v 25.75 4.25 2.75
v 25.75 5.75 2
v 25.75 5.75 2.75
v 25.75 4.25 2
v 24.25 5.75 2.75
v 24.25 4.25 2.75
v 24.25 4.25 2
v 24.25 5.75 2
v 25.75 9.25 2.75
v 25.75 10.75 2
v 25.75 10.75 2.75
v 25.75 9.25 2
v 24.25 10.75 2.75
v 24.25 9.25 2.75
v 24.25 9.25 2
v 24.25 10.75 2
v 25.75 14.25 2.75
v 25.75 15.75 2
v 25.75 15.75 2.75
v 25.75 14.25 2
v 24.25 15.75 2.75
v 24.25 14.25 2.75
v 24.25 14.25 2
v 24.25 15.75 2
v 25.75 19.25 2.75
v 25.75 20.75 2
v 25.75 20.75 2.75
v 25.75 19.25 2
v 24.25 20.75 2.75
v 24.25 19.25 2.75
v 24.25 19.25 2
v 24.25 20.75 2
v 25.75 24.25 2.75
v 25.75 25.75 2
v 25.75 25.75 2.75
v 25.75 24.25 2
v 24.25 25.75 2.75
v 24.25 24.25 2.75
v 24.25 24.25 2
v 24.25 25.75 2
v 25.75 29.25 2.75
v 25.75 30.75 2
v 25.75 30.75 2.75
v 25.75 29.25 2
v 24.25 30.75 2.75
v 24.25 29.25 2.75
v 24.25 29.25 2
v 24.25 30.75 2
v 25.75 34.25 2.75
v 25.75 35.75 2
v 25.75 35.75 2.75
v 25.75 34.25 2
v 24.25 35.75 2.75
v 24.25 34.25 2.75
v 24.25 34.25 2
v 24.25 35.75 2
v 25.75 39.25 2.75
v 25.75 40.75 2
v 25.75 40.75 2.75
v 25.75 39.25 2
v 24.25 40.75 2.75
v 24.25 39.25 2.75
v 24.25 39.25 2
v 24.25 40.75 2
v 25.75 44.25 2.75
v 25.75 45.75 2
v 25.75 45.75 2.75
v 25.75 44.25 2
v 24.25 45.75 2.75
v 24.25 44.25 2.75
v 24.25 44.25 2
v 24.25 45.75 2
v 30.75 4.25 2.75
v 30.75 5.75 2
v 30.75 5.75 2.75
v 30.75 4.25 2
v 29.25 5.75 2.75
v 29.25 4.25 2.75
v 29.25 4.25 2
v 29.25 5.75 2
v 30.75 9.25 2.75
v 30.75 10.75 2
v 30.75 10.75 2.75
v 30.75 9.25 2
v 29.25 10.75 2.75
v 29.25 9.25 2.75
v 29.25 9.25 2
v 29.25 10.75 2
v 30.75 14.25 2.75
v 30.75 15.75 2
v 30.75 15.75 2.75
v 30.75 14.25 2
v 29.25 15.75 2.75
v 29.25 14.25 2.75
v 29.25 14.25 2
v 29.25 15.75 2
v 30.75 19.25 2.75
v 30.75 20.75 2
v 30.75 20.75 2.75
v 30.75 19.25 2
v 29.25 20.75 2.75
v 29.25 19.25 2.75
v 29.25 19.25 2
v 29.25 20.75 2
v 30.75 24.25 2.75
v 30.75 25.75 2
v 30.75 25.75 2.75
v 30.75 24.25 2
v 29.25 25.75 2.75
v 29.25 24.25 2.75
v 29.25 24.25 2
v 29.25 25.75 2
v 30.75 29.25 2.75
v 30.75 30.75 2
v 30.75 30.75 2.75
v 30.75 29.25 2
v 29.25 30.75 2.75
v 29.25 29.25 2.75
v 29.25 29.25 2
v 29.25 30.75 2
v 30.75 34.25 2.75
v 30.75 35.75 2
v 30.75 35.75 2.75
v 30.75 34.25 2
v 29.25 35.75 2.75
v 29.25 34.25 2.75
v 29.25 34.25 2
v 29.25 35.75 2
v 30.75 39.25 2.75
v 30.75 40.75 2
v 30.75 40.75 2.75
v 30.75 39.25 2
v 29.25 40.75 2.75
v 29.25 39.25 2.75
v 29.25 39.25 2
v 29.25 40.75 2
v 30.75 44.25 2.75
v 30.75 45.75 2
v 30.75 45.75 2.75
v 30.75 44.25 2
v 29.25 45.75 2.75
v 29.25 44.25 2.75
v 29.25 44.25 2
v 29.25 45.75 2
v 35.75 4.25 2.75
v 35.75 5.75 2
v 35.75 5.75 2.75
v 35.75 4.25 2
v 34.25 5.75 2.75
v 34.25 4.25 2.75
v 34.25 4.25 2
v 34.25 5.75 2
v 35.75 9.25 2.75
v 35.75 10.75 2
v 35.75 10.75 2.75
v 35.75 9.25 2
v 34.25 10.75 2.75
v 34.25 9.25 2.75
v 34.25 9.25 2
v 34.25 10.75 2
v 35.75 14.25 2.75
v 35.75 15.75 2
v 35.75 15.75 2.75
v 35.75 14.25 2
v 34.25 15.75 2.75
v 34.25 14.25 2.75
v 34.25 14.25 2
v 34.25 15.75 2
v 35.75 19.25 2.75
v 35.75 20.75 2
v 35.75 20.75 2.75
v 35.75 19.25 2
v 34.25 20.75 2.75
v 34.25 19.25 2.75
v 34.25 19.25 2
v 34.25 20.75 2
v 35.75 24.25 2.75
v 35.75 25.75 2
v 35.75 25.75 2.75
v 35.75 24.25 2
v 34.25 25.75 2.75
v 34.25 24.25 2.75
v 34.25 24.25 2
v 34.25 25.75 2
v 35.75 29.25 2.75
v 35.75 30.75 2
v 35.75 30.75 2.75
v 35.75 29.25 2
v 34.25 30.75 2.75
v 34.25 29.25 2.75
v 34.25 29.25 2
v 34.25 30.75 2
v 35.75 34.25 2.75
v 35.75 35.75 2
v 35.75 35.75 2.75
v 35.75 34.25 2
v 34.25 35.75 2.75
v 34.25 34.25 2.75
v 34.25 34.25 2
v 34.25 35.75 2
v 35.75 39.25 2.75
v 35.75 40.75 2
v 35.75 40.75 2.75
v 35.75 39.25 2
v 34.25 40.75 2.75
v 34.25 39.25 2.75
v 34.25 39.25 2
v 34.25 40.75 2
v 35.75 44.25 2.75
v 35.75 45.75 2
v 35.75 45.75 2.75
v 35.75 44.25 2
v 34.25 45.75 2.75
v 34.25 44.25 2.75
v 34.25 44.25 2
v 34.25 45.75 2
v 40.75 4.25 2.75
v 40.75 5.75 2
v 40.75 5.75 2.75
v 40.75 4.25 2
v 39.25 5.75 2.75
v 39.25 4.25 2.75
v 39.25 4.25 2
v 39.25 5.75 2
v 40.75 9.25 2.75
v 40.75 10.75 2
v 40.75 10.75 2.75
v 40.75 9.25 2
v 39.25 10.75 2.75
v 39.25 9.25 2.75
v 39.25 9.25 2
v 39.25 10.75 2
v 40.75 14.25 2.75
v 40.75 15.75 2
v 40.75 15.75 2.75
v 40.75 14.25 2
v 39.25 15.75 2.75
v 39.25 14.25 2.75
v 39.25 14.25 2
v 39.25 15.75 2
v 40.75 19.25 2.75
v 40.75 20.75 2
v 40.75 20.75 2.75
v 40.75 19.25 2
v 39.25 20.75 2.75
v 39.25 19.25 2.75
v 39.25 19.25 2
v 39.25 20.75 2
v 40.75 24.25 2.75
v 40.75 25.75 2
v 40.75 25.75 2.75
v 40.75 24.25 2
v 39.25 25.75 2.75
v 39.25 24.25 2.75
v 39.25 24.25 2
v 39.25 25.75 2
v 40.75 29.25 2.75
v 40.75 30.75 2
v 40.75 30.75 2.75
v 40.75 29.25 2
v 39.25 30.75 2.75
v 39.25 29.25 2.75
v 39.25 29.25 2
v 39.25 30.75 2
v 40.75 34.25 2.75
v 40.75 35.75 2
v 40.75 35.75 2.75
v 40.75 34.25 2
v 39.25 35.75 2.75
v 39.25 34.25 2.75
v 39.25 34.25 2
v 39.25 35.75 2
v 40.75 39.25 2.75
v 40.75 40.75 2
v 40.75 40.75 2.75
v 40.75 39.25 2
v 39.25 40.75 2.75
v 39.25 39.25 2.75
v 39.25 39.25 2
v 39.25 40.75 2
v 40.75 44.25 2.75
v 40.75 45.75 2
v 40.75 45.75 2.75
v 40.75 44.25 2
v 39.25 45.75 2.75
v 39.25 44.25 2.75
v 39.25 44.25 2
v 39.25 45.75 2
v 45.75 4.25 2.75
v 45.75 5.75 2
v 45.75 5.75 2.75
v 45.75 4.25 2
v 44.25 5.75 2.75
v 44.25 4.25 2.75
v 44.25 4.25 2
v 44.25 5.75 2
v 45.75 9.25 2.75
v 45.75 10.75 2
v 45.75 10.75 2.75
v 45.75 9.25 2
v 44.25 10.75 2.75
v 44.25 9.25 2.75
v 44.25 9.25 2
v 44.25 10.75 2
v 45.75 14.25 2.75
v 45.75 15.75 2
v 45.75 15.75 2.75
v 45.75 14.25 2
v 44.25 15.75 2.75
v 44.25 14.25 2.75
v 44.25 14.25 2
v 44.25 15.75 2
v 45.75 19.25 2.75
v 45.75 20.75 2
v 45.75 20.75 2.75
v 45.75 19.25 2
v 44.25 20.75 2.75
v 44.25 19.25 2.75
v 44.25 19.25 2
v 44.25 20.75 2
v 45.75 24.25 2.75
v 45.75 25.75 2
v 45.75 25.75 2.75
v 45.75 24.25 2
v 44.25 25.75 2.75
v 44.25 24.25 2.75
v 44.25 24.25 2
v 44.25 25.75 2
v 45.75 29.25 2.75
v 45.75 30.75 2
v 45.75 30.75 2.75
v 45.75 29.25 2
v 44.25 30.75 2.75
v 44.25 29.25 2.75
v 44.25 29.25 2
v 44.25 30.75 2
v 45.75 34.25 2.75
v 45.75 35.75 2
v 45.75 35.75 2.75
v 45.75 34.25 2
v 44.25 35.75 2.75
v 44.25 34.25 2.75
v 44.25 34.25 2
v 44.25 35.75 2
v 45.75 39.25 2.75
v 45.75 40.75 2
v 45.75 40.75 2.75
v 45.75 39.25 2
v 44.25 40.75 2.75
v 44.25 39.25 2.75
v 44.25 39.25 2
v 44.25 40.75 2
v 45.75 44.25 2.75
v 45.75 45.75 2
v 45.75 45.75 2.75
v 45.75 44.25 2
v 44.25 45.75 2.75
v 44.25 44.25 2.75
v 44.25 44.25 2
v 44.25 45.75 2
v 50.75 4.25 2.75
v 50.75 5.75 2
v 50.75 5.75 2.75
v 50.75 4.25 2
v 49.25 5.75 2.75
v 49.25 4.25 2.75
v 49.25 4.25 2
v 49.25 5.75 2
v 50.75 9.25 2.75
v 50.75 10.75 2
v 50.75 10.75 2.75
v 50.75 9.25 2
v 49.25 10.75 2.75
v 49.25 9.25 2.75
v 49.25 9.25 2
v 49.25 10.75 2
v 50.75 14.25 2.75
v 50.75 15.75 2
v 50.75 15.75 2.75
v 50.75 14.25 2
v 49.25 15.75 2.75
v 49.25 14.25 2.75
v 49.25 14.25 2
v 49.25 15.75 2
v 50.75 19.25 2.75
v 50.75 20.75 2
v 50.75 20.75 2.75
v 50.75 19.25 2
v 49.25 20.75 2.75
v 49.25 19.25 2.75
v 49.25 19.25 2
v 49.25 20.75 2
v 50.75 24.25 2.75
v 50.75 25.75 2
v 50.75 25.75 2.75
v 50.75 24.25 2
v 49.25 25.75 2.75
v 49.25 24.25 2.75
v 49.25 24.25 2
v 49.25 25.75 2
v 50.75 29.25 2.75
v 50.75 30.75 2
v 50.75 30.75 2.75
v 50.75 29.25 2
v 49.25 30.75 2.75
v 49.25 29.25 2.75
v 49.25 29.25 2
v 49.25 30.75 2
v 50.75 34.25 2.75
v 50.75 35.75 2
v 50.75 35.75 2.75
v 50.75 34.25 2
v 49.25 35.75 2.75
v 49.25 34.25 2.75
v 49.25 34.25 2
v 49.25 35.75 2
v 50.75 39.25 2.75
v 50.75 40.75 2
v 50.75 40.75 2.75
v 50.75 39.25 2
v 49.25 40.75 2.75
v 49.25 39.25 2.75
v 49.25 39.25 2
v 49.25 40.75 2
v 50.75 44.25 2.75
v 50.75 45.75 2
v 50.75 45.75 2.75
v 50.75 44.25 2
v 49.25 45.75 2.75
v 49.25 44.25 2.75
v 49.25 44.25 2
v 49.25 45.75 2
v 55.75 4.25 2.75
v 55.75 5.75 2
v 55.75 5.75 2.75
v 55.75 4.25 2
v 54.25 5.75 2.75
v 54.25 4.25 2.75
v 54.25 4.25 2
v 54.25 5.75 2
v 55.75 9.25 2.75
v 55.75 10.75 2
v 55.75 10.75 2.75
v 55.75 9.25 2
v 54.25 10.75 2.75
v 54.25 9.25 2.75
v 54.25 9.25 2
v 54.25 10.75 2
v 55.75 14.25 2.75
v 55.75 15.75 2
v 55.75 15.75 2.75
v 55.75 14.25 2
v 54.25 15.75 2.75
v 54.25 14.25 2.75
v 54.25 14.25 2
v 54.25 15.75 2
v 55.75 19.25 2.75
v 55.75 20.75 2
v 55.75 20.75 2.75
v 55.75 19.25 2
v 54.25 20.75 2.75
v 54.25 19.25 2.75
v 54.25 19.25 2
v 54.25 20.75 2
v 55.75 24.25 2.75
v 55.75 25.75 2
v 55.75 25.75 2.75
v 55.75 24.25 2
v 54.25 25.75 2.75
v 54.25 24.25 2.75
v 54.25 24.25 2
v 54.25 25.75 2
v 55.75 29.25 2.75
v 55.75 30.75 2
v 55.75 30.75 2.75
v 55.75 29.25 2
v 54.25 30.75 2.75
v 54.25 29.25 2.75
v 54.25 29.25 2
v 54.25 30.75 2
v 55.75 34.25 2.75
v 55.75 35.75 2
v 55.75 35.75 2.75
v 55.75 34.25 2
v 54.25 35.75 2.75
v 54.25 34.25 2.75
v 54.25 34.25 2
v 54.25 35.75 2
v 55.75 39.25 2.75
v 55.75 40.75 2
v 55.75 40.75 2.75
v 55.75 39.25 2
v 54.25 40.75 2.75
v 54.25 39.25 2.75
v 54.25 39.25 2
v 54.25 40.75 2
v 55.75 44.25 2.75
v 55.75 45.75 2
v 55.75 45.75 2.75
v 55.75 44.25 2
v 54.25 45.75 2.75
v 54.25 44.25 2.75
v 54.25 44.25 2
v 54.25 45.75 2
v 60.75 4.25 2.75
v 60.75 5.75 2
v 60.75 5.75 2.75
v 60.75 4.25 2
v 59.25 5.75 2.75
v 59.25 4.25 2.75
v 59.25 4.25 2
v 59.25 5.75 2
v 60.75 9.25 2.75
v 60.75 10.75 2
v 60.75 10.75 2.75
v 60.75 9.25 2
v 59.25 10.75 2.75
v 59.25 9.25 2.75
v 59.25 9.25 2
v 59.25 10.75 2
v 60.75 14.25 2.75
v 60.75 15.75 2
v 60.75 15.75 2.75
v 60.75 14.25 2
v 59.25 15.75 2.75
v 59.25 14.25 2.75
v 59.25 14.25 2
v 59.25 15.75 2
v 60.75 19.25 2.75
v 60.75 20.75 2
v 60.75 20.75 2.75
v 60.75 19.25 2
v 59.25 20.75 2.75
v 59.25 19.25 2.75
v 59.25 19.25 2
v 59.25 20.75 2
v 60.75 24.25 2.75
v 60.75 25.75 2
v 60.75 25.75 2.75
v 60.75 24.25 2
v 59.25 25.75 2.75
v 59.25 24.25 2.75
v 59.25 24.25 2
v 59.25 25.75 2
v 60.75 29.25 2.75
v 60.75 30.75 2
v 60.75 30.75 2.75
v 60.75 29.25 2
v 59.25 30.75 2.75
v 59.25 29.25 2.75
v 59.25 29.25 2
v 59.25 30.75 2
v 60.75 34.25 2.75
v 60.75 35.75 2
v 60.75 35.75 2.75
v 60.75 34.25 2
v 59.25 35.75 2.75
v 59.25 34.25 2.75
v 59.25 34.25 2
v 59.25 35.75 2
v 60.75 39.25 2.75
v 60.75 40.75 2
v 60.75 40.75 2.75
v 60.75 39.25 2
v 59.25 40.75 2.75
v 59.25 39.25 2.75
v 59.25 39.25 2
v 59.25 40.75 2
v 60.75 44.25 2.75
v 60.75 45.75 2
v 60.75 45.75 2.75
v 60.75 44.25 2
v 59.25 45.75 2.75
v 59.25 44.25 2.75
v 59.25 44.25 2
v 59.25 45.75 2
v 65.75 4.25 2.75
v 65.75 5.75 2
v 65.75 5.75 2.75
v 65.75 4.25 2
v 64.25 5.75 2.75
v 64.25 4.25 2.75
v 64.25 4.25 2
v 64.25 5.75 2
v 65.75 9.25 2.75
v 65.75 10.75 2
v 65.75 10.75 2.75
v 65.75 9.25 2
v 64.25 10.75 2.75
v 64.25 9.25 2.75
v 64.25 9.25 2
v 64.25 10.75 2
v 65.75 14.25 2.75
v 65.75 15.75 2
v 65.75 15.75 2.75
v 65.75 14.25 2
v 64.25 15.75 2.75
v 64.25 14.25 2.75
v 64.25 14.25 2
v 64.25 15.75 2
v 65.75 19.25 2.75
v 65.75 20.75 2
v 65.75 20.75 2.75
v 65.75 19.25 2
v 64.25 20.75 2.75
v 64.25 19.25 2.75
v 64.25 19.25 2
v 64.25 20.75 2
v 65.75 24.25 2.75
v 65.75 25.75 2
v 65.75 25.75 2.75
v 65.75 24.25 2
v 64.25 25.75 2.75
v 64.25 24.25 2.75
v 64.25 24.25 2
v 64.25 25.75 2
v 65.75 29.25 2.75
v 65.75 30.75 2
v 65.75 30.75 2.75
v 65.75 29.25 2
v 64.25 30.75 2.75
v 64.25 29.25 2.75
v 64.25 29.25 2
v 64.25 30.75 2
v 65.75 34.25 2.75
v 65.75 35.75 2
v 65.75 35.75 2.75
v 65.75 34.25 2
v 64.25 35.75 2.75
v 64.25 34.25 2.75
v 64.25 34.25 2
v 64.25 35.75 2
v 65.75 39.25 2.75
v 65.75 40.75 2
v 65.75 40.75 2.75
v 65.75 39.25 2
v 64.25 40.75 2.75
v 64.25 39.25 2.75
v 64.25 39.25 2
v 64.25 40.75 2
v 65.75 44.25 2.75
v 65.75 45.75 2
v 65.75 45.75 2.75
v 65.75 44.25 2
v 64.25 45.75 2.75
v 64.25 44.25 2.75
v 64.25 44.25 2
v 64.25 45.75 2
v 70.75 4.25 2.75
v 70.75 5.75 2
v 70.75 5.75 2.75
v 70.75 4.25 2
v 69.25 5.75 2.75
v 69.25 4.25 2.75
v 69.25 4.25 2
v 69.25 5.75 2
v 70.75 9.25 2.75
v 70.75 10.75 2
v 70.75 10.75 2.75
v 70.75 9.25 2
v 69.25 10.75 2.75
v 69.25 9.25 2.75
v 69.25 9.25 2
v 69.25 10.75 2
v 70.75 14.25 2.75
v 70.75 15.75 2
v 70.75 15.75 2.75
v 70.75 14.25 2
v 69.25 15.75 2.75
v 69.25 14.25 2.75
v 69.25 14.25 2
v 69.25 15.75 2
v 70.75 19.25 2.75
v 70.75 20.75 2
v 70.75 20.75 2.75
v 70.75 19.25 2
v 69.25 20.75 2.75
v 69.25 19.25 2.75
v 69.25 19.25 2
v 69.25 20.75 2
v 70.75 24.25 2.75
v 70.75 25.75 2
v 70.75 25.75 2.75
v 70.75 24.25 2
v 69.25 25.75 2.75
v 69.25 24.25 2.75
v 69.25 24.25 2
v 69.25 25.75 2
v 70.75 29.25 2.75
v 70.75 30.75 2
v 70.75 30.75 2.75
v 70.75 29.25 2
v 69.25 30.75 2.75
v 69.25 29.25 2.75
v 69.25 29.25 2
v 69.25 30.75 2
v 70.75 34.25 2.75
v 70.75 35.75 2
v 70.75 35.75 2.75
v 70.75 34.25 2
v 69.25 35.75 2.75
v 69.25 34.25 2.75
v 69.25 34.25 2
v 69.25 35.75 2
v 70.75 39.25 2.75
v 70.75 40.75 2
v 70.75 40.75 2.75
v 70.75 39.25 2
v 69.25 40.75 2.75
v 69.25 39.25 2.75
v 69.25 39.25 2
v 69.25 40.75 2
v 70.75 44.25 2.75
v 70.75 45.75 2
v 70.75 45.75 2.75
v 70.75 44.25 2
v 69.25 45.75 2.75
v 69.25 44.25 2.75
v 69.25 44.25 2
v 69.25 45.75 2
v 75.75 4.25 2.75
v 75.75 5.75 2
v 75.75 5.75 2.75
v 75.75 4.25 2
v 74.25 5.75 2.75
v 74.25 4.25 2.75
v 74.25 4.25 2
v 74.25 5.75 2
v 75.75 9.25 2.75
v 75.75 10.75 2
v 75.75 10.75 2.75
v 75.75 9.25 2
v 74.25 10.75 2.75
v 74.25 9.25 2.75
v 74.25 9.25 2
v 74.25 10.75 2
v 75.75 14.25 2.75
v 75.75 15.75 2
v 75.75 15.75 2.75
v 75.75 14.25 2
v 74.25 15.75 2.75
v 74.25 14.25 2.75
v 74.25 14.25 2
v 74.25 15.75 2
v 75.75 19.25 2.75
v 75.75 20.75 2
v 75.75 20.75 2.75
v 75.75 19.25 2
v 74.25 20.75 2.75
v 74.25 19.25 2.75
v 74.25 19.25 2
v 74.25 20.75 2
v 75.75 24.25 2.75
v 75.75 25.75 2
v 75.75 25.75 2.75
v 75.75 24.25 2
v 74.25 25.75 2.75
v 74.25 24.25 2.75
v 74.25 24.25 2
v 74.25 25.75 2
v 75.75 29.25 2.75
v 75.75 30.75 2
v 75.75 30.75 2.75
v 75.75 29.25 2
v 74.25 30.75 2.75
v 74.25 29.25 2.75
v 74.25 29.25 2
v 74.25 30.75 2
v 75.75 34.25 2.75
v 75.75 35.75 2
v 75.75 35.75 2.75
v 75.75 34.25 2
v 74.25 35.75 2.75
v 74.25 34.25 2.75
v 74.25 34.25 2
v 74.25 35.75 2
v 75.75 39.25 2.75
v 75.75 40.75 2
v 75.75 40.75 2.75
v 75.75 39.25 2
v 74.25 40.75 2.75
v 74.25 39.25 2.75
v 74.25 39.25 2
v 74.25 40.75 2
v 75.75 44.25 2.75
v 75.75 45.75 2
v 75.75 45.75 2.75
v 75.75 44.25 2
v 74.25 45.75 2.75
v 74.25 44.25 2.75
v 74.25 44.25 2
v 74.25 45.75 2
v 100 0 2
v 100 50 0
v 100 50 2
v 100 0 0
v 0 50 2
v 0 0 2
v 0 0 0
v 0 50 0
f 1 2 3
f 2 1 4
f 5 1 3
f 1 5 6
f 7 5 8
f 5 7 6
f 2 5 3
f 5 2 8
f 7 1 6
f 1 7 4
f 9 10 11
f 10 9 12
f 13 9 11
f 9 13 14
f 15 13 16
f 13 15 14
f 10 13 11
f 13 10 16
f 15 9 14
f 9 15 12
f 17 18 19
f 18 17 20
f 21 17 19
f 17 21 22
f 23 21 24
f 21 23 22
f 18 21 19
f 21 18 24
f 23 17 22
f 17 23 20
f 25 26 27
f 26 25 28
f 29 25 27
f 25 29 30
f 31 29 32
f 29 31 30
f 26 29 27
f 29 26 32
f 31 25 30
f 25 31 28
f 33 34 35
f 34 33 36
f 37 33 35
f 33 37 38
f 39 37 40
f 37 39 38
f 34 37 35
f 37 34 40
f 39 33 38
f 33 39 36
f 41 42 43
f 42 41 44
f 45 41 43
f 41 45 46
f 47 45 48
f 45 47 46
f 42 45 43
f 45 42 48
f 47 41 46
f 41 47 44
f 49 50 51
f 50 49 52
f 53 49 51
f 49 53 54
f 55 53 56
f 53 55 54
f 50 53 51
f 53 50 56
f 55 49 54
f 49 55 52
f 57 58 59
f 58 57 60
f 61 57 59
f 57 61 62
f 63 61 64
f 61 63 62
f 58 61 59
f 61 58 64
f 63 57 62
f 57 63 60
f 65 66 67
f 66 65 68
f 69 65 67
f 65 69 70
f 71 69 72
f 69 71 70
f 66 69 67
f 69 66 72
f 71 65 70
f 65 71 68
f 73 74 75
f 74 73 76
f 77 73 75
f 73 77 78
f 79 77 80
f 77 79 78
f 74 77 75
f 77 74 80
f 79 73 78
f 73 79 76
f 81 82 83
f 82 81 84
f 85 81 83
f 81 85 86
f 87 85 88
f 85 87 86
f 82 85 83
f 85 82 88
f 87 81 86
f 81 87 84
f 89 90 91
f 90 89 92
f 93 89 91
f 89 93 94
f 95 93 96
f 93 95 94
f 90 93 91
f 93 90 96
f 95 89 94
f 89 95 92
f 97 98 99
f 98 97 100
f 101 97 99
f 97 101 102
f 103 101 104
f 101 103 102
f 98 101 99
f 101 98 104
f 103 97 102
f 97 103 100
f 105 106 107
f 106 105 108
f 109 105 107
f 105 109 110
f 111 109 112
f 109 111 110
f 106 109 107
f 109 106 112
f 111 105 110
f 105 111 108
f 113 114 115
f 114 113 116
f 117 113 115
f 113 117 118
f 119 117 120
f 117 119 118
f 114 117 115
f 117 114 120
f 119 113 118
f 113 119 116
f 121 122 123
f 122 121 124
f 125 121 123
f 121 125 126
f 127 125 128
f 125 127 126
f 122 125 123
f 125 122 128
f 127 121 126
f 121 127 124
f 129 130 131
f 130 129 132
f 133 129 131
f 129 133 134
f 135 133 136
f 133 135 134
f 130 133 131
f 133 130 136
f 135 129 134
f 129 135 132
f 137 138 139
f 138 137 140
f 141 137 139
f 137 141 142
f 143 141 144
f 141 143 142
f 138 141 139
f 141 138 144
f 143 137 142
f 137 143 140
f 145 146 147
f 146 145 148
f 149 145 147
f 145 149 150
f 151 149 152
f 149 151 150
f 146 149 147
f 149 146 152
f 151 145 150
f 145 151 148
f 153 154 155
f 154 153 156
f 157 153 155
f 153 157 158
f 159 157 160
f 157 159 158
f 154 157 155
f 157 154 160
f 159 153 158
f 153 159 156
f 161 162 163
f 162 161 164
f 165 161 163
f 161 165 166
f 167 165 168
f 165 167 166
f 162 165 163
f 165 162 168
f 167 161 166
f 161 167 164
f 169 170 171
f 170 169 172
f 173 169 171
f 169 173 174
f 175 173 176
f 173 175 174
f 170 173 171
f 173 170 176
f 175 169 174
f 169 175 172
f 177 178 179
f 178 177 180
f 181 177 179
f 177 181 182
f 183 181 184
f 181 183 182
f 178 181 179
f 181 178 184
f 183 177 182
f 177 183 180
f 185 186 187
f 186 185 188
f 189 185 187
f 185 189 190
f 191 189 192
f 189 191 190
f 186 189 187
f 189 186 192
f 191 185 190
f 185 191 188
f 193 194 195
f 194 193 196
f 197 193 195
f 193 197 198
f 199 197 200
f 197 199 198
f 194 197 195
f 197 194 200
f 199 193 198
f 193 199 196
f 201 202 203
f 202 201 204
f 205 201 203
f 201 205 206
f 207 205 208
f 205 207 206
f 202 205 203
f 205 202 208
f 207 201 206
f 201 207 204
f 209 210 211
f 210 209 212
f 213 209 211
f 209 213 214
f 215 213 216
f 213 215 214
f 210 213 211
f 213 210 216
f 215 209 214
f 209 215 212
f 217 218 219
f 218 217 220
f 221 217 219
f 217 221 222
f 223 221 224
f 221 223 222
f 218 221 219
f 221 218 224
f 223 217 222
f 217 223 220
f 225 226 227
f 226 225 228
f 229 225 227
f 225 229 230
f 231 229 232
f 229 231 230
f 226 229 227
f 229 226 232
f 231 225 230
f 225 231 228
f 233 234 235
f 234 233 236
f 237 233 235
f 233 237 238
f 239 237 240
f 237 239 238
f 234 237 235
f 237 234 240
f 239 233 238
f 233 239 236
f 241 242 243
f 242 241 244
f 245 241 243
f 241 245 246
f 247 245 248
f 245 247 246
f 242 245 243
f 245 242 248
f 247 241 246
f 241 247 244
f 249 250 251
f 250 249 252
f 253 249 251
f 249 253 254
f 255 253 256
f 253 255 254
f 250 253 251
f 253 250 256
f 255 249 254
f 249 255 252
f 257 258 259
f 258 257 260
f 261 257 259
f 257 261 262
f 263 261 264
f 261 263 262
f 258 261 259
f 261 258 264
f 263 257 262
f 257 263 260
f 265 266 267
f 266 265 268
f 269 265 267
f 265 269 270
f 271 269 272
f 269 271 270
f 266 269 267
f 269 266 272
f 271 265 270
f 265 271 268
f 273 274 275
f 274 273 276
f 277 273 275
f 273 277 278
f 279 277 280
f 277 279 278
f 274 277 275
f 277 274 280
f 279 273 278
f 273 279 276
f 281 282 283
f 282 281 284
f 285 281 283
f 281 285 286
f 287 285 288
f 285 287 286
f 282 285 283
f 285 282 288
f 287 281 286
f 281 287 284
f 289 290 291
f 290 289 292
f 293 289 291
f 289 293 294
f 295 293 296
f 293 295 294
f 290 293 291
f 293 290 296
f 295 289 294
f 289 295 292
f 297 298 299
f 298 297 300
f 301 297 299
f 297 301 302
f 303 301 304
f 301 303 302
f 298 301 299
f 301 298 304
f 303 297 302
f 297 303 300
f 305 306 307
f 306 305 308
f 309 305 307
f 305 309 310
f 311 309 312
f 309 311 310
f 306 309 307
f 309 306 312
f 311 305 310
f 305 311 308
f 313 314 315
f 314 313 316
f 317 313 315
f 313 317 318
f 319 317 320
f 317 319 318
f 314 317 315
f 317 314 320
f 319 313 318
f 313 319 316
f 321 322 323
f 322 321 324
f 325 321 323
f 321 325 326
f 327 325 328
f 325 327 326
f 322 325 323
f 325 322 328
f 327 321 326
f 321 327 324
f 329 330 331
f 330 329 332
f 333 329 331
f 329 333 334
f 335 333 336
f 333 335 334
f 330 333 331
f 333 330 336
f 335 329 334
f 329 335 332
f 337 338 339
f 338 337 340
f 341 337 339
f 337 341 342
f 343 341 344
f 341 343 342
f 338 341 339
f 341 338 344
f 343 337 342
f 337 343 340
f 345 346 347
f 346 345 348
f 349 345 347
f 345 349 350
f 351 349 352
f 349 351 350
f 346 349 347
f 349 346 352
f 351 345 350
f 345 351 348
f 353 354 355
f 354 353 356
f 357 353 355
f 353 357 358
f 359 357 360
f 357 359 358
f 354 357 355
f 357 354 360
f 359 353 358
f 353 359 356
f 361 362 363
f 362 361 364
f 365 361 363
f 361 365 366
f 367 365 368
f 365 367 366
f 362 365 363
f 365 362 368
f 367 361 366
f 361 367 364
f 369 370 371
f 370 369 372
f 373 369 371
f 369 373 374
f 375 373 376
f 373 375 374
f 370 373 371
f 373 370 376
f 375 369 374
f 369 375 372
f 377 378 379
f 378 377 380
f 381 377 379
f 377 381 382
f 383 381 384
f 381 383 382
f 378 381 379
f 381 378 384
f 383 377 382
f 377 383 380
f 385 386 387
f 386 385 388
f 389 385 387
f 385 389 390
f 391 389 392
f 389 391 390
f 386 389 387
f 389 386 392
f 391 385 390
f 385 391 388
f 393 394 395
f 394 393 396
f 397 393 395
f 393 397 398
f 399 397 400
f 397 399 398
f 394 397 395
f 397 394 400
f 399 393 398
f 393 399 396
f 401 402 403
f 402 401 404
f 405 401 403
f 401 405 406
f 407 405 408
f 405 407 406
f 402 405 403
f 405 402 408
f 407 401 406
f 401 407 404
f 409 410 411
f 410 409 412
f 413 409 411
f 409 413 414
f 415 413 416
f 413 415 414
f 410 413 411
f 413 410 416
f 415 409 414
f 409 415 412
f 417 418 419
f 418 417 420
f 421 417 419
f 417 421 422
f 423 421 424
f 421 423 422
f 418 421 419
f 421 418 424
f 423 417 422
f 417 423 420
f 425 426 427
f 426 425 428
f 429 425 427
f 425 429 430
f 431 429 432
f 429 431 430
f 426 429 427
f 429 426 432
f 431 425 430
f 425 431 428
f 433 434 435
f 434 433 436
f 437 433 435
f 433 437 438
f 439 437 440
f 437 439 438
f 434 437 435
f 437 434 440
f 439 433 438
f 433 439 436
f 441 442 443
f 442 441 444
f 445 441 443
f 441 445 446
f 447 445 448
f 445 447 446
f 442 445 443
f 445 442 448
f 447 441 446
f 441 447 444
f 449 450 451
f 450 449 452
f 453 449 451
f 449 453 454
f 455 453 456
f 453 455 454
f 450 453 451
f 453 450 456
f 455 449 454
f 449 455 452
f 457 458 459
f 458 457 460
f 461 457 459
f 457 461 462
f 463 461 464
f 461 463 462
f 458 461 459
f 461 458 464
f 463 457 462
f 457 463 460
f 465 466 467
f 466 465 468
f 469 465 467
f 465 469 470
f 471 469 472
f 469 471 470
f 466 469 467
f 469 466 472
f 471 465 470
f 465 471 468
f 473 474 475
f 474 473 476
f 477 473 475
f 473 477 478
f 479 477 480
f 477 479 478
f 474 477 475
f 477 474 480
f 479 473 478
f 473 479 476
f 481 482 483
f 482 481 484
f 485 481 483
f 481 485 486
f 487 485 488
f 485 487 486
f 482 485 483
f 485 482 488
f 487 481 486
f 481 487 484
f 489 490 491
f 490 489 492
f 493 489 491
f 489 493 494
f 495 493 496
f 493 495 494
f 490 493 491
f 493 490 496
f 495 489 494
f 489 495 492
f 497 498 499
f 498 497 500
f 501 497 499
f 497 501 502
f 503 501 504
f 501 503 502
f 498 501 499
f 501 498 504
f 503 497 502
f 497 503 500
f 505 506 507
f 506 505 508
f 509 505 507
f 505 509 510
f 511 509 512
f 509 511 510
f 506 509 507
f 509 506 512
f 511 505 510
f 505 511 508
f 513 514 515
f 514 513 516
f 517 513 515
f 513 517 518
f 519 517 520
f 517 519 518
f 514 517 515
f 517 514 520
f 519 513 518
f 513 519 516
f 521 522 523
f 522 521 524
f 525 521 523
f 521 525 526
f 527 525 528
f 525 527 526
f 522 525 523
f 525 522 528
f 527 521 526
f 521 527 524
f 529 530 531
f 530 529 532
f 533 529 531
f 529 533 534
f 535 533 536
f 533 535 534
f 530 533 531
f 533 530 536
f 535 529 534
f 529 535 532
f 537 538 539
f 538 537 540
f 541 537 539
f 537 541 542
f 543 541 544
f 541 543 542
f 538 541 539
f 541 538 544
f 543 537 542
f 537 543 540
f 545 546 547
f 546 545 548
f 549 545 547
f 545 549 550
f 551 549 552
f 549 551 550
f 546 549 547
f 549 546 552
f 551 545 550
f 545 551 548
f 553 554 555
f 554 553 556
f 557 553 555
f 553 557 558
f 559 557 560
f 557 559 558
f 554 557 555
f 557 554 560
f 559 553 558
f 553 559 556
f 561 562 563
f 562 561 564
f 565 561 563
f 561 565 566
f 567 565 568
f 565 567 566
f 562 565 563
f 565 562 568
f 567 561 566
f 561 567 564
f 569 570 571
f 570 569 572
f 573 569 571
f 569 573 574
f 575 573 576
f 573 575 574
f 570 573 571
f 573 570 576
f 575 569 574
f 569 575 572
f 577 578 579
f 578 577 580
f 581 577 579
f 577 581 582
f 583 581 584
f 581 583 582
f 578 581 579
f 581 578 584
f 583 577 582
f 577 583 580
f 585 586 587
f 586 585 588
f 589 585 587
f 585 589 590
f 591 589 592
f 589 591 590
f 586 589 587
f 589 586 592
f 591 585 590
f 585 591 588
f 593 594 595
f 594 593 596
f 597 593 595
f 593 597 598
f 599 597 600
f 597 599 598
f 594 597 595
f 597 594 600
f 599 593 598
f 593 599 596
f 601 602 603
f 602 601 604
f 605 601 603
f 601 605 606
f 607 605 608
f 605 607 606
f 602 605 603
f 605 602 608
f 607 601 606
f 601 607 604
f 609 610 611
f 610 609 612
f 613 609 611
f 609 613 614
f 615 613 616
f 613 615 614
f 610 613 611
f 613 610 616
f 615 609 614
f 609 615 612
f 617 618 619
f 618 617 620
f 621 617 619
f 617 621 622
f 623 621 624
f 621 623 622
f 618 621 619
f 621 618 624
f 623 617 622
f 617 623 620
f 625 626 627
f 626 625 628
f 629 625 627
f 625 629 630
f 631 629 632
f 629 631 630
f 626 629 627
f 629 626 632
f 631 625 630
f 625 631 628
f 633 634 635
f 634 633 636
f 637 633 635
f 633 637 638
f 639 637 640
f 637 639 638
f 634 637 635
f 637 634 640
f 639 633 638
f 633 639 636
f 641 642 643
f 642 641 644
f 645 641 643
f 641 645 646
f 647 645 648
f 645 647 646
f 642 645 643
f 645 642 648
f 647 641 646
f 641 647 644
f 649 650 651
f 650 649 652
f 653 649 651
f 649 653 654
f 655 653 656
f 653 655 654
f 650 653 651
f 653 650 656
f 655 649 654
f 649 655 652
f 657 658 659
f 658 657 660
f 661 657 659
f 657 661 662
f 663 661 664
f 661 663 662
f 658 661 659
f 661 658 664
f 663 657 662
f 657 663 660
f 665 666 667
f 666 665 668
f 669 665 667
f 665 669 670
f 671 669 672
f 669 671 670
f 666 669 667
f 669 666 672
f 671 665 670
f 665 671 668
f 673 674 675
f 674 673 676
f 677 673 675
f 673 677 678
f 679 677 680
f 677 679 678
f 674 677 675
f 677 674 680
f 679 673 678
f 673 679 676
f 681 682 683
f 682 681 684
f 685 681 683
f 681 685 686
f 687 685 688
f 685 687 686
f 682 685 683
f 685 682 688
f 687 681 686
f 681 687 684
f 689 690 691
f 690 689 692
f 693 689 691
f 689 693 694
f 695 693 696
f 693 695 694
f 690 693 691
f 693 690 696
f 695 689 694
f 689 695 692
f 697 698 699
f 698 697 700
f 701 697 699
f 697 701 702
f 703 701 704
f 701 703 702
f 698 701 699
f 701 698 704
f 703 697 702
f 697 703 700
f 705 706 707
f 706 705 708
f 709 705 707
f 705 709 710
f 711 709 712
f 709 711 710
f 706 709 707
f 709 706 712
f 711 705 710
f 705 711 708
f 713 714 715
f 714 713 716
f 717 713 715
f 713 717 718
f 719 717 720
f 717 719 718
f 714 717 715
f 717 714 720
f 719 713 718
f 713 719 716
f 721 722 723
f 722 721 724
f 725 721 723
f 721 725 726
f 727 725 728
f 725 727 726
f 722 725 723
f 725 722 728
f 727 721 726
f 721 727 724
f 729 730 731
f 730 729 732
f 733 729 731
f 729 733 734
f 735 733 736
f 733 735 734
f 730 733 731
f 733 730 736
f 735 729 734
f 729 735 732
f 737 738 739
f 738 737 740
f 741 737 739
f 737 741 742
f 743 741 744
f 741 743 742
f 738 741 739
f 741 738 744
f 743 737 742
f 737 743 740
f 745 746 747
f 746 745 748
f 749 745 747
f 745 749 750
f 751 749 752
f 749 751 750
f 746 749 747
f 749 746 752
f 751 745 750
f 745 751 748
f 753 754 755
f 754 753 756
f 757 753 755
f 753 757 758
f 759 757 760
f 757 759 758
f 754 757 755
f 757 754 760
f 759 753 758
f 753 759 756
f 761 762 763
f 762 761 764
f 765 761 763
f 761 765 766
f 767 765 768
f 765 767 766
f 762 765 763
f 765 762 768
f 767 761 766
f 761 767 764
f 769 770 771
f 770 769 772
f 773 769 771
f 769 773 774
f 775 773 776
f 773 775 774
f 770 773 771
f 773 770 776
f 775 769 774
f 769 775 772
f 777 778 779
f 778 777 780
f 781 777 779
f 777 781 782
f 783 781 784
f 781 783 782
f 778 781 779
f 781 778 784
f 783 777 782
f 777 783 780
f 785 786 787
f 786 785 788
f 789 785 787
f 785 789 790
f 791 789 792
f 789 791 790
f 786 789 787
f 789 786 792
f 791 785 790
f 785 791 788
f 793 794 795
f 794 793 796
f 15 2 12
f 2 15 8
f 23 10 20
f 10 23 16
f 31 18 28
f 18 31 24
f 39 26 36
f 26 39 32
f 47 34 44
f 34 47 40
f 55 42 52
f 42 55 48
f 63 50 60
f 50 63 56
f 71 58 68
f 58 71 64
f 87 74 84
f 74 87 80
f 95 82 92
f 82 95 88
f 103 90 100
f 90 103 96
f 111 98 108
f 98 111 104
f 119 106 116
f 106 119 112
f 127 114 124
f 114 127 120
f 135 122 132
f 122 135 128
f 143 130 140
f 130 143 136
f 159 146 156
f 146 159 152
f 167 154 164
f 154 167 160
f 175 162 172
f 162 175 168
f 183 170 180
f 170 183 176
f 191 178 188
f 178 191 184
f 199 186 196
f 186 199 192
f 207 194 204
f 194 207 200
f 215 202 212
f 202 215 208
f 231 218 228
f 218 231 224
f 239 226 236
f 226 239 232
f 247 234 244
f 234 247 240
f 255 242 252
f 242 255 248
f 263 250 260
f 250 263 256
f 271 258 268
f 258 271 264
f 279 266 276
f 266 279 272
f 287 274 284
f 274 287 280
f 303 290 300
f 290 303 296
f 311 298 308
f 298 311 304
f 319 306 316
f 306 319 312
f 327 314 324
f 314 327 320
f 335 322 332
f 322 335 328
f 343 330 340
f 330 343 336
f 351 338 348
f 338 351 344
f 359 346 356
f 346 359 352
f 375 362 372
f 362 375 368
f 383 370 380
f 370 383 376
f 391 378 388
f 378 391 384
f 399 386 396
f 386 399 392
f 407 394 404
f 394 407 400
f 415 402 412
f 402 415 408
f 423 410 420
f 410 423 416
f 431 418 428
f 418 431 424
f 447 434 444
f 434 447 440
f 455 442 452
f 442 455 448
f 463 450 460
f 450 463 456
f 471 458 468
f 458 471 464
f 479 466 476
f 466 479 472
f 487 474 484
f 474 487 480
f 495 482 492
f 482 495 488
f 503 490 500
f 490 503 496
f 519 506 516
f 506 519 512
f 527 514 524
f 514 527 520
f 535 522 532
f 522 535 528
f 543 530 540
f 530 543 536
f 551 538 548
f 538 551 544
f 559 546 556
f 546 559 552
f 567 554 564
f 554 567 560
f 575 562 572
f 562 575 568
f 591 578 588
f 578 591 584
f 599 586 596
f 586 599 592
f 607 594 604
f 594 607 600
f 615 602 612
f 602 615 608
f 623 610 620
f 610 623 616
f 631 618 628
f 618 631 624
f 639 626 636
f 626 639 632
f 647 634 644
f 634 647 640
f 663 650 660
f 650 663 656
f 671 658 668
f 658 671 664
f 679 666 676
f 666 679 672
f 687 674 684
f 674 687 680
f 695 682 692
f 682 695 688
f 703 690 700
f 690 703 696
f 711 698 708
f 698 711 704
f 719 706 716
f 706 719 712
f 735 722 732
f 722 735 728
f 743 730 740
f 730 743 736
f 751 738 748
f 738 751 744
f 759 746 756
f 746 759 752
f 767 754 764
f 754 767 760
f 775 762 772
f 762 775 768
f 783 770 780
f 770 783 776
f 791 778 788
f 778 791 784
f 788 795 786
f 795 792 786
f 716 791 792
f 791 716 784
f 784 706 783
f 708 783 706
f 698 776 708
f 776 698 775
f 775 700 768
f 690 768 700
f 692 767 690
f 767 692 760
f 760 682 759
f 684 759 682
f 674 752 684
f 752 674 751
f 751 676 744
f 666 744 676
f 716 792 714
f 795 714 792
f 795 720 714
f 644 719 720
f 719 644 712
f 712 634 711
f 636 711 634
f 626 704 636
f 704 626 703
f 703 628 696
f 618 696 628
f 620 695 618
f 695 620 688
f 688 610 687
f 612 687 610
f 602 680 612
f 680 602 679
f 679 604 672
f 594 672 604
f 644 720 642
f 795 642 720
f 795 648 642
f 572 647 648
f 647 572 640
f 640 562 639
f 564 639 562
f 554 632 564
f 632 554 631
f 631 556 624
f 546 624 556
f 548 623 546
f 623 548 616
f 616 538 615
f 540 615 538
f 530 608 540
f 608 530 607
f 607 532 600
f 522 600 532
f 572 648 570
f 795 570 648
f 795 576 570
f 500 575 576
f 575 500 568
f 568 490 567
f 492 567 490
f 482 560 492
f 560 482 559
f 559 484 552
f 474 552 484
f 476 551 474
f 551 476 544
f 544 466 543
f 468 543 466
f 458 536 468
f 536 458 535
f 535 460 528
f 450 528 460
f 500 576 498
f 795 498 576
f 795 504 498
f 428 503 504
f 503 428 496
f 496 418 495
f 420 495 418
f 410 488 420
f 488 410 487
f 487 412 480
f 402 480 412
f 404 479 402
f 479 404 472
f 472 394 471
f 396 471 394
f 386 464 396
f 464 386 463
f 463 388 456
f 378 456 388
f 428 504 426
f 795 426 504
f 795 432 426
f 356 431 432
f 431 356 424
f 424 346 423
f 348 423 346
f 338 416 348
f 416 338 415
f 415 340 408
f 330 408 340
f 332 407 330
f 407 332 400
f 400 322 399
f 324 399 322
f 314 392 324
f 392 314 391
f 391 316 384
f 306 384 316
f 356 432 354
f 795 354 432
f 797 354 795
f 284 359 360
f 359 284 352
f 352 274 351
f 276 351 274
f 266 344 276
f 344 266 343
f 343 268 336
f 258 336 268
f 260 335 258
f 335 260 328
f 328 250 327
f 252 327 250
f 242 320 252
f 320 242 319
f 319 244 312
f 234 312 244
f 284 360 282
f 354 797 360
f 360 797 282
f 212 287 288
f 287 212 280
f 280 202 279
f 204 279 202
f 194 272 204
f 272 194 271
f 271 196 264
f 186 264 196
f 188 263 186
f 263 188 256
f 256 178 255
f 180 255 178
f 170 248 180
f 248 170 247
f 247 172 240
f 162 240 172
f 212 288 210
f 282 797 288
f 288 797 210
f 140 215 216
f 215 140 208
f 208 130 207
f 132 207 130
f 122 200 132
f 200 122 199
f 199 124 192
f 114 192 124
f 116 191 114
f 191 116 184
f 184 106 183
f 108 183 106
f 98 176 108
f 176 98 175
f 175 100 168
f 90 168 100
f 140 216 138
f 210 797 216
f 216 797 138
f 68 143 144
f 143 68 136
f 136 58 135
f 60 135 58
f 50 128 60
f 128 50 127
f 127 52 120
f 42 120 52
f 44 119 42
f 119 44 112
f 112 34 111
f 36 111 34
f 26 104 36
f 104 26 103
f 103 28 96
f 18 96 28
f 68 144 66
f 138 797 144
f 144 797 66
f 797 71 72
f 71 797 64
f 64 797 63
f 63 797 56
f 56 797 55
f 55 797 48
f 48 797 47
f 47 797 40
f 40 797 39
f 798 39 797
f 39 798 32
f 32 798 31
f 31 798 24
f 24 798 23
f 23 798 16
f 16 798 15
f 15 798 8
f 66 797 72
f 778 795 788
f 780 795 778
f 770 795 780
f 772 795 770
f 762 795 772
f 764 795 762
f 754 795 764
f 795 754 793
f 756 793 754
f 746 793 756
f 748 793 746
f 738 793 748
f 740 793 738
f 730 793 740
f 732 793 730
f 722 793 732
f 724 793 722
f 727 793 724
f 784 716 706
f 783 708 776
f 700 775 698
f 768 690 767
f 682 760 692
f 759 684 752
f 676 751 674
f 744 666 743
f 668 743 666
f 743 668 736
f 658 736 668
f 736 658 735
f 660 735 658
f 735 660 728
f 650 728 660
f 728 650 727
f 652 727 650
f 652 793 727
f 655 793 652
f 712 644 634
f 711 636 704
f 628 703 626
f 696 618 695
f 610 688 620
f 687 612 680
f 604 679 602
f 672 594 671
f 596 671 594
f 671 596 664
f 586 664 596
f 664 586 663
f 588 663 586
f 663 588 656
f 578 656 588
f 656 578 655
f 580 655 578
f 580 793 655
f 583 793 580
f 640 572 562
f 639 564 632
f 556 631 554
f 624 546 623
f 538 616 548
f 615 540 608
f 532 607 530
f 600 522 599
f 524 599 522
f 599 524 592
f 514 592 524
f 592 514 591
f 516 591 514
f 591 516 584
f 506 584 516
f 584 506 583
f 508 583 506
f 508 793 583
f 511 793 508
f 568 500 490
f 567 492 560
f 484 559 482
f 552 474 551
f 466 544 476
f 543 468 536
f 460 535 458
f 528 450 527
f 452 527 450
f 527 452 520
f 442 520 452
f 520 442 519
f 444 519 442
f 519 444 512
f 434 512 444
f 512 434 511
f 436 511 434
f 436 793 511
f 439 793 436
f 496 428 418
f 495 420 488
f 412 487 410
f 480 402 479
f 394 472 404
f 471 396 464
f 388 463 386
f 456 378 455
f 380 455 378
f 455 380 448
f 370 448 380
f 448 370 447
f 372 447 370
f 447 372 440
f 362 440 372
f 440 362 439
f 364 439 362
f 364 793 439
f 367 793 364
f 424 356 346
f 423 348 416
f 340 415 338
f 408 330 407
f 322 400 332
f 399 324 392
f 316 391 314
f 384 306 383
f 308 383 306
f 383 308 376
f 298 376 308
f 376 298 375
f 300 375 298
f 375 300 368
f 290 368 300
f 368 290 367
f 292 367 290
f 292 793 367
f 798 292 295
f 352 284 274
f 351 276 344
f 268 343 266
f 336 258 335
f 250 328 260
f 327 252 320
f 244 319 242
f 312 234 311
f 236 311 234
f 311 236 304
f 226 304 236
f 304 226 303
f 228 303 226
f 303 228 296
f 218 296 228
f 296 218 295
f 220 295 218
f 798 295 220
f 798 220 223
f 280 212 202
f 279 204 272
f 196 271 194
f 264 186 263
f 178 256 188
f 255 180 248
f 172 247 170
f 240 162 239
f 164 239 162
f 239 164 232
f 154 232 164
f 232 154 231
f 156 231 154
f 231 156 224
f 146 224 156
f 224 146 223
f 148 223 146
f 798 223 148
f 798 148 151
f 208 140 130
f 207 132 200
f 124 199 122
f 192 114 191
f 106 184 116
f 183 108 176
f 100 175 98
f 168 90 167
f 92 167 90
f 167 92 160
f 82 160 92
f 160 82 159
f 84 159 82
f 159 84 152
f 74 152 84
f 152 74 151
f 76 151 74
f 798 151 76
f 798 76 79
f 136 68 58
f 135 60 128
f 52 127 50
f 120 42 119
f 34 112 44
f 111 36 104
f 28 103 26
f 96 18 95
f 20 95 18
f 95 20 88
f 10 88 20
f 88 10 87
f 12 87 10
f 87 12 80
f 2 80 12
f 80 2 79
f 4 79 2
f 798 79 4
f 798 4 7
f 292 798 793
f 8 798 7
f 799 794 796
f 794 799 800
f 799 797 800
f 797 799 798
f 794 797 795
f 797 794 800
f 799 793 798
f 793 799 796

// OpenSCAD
mold_size = [100, 50, 2];

bump_size = 1.5;
bump_spacing = 5;
base = [20, 0, 2];

cube(mold_size);
    
for (i=[1:1:11]) {
        for (j=[1:1:9]) {
            translate(base + [i * bump_spacing, j * bump_spacing, 0])
                cube(bump_size, center = true);
        }
    };
